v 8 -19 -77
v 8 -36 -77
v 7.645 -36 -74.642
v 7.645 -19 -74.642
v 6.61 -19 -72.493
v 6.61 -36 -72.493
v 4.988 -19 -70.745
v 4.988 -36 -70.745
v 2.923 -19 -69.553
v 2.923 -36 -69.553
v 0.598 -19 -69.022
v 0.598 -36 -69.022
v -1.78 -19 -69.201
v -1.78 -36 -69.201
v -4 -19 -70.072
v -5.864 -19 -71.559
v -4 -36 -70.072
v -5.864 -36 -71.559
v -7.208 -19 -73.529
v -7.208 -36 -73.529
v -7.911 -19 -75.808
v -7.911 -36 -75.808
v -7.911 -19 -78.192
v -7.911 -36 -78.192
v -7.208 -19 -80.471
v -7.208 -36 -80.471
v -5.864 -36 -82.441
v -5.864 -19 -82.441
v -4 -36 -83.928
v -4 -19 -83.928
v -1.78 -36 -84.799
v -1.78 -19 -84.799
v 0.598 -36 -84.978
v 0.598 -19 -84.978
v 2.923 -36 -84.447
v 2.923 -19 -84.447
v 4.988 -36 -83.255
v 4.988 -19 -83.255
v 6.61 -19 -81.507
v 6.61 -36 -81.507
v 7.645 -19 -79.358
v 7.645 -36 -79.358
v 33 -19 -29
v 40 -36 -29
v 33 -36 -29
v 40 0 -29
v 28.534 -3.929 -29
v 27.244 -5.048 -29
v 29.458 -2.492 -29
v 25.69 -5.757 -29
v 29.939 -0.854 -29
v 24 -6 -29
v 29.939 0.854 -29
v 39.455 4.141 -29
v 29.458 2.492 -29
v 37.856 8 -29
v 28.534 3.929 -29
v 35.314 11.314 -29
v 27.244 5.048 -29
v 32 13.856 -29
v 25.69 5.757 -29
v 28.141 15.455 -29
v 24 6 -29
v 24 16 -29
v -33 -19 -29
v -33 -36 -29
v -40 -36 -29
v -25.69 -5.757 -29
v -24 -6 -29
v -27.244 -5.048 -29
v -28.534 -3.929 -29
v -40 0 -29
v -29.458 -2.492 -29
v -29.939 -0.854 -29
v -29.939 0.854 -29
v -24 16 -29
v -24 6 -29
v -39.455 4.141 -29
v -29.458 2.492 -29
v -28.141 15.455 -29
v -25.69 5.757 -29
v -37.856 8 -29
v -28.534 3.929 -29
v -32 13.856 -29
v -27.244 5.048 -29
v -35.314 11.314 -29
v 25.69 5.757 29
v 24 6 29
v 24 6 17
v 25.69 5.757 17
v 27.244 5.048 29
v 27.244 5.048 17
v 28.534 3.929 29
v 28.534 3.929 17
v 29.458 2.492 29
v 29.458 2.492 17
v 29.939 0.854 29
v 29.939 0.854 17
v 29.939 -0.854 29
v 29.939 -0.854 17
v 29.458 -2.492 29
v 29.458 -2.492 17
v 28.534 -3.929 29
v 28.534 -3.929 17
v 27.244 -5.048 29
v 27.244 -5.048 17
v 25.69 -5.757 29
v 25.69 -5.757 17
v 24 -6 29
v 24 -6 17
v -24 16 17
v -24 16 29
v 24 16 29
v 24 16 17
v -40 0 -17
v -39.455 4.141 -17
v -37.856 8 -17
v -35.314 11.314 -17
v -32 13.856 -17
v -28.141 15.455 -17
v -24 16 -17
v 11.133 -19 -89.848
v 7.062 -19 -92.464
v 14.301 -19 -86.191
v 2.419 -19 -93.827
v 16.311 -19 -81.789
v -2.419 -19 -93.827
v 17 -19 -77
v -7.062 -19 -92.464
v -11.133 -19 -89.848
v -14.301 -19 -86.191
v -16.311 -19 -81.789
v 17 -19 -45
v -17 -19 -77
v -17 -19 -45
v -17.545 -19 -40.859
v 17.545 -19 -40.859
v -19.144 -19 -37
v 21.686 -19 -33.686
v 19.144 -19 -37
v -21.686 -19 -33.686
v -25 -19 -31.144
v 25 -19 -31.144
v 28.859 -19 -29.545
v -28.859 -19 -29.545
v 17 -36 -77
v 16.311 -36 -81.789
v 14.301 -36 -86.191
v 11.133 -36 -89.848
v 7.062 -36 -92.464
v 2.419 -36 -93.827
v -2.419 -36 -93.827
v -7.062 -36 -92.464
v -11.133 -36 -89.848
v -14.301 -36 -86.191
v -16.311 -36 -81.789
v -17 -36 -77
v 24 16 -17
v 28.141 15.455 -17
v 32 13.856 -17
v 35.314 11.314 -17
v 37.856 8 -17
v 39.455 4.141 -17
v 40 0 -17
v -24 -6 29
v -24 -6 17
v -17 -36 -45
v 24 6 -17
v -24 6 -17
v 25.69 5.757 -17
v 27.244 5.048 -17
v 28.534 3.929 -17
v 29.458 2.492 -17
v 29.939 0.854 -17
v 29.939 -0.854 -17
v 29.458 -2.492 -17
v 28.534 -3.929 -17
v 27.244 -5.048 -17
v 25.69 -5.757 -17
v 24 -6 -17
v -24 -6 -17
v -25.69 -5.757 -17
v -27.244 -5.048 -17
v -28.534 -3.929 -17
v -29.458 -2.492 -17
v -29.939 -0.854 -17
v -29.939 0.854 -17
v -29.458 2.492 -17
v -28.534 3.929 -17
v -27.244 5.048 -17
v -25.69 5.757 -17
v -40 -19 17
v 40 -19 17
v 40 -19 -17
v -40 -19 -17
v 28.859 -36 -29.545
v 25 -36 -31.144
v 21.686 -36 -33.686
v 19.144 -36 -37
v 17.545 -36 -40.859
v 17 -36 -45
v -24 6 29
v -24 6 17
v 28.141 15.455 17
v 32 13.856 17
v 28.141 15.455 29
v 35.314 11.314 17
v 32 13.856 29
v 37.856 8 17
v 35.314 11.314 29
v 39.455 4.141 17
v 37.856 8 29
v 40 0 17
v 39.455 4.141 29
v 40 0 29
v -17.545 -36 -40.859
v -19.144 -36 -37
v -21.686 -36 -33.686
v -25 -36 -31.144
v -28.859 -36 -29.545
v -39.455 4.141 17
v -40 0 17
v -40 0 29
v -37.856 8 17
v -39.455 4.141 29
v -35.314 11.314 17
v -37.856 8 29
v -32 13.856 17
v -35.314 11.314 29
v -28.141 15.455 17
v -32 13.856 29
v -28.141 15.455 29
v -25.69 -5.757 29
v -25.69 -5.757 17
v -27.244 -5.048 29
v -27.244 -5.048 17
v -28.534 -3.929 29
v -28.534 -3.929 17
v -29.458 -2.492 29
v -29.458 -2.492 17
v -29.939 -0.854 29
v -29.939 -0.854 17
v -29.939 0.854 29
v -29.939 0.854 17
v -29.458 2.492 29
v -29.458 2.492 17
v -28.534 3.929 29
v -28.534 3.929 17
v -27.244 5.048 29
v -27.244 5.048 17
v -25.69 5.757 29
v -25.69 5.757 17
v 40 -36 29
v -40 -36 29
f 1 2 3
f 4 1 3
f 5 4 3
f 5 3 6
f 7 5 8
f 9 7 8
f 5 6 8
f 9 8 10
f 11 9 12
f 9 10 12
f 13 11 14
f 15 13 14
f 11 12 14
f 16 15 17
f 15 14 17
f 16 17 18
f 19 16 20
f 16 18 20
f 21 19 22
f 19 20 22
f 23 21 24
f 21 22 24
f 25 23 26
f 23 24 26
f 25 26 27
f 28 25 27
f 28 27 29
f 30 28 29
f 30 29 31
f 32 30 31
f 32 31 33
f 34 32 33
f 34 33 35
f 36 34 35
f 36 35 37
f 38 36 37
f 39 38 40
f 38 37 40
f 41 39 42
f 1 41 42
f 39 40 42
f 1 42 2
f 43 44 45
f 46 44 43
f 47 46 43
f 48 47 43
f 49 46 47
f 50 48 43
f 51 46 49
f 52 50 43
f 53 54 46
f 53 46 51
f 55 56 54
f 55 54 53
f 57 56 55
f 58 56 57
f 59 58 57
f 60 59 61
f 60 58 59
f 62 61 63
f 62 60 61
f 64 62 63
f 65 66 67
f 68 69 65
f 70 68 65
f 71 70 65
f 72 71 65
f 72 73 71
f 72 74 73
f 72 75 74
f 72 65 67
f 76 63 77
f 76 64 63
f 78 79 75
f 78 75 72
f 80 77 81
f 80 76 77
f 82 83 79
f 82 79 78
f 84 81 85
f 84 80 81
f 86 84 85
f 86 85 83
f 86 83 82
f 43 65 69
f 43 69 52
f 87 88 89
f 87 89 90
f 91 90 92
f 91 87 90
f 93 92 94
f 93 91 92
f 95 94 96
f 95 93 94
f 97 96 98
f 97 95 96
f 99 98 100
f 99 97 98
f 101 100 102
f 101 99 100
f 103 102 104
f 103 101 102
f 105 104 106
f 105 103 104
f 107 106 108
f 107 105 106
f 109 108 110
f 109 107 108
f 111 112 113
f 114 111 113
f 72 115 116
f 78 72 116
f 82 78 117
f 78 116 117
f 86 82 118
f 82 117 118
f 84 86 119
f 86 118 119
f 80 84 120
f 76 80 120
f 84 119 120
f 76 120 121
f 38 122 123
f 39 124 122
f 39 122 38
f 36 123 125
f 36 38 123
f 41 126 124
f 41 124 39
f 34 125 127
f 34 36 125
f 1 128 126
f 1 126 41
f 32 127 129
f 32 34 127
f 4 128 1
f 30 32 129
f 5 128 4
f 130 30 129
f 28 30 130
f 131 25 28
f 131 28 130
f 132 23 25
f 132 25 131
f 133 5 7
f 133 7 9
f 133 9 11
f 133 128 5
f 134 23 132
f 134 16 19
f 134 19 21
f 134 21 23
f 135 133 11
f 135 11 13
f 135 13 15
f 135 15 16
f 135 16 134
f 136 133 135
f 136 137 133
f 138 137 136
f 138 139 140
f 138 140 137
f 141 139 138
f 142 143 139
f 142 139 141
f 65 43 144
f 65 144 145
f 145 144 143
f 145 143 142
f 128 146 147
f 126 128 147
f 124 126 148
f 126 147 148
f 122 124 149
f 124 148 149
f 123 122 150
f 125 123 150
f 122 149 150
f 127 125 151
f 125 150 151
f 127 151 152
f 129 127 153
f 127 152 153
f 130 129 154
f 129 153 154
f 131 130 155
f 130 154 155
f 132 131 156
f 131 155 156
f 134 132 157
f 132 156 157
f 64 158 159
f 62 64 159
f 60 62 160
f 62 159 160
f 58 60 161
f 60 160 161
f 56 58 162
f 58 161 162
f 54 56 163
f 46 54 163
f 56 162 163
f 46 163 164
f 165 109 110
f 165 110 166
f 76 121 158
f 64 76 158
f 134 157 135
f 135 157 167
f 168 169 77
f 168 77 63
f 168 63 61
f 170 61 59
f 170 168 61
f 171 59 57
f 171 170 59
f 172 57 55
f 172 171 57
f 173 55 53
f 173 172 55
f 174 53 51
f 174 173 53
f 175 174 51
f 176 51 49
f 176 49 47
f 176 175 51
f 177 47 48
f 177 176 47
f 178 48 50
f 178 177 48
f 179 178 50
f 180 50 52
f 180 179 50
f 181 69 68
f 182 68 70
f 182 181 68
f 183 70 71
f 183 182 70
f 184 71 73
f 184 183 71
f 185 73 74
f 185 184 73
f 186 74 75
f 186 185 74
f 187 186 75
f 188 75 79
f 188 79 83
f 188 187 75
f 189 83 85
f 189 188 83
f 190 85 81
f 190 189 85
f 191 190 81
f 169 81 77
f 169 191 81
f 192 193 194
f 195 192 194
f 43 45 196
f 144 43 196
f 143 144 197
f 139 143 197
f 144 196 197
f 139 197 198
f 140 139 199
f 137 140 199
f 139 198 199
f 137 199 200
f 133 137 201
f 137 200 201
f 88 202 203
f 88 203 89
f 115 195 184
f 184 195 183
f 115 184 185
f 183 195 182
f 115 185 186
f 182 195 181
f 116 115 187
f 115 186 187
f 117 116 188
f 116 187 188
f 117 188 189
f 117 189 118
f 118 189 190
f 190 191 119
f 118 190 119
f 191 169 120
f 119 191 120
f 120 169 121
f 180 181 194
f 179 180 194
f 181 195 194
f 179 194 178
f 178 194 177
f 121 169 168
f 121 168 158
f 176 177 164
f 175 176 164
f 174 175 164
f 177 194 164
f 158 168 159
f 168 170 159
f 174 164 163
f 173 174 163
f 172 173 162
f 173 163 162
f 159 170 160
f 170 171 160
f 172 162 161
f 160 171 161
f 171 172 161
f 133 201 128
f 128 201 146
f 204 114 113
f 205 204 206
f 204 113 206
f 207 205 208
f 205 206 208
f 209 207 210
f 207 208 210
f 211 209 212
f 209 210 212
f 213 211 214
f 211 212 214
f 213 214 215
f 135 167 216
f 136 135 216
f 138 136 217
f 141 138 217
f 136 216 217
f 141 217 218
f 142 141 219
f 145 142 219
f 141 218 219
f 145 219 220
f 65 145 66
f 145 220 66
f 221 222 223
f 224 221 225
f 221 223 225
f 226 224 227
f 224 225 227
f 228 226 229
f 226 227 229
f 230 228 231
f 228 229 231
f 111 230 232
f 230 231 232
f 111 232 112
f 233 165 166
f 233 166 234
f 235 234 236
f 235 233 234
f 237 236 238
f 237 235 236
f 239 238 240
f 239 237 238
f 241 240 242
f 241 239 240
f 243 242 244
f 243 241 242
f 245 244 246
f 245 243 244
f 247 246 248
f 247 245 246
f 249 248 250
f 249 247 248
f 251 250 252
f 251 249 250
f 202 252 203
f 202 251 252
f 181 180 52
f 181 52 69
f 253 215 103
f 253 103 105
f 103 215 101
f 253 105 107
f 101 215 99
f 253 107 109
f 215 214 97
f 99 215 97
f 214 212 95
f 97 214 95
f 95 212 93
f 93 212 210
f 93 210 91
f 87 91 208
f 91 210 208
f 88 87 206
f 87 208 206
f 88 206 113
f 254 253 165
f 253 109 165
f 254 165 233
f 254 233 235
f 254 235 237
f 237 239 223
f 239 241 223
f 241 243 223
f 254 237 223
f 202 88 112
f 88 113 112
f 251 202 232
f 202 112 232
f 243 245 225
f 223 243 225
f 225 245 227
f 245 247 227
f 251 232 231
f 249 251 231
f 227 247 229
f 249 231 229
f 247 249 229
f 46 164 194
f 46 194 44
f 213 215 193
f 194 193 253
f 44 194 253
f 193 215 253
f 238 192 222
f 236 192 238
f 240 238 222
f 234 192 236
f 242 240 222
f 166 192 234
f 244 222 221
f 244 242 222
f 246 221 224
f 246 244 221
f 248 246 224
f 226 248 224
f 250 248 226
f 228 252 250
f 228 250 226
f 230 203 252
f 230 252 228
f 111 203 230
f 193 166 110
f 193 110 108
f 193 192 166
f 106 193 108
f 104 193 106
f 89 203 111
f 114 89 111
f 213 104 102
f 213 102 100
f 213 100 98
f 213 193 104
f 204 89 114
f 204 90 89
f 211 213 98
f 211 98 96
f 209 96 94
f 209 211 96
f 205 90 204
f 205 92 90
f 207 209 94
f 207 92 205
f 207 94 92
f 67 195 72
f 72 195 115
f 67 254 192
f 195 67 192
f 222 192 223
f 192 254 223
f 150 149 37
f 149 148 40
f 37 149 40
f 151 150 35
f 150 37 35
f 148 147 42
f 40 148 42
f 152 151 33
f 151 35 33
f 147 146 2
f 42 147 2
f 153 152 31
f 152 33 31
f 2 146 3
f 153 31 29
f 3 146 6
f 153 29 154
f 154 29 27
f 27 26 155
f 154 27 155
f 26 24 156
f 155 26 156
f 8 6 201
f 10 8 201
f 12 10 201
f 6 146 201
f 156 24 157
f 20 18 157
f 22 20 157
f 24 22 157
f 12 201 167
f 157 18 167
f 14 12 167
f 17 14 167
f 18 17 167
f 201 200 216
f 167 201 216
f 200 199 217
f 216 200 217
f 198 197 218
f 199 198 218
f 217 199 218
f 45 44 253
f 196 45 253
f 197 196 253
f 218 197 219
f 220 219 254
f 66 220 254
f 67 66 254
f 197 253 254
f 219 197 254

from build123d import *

# Parameters (mm, degrees)
EXTRUDE_2_DEPTH          = 29
SKETCH_3_W               = 34
SKETCH_3_H               = 35
CUT_EXTRUDE_1_DEPTH      = 41
CUT_EXTRUDE_1_DEPTH_BACK = 41
SKETCH_4_R               = 8
EXTRUDE_3_DEPTH          = 17


with BuildPart() as part:
    # 草圖1 → 填料-伸長2 (new body, symmetric)
    with BuildSketch(Plane.XY):
        with BuildLine():
            Line((-24, 16), (24, 16))
            ThreePointArc((24, 16), (35.313708499, 11.313708499), (40, 0))
            Line((40, 0), (40, -36))
            Line((40, -36), (-40, -36))
            Line((-40, -36), (-40, 0))
            ThreePointArc((-40, 0), (-35.313708499, 11.313708499), (-24, 16))
        make_face()
        with BuildLine():
            Line((-24, 6), (24, 6))
            ThreePointArc((24, 6), (30, 0), (24, -6))
            Line((24, -6), (-24, -6))
            ThreePointArc((-24, -6), (-30, 0), (-24, 6))
        make_face(mode=Mode.SUBTRACT)
    extrude(amount=EXTRUDE_2_DEPTH, both=True)

    # 草圖3 → 除料-伸長1 (cut, two sides)
    with BuildSketch(Plane(origin=(0, 0, 0), x_dir=(0, 0, -1), z_dir=(1, 0, 0))) as cut_extrude_1_sk:
        with Locations((0, -1.5)):
            Rectangle(SKETCH_3_W, SKETCH_3_H)
    extrude(amount=CUT_EXTRUDE_1_DEPTH, mode=Mode.SUBTRACT)
    extrude(cut_extrude_1_sk.sketch, amount=-CUT_EXTRUDE_1_DEPTH_BACK, mode=Mode.SUBTRACT)

    # 草圖4 → 填料-伸長3 (add)
    with BuildSketch(Plane.XZ.offset(36)):
        with BuildLine():
            Line((-17, -77), (-17, -45))
            ThreePointArc((-17, -45), (-21.686291501, -33.686291501), (-33, -29))
            Line((-33, -29), (33, -29))
            ThreePointArc((33, -29), (21.686291501, -33.686291501), (17, -45))
            Line((17, -45), (17, -77))
            ThreePointArc((17, -77), (0, -94), (-17, -77))
        make_face()
        with Locations((0, -77)):
            Circle(SKETCH_4_R, mode=Mode.SUBTRACT)
    extrude(amount=-EXTRUDE_3_DEPTH)


solid = part.part
